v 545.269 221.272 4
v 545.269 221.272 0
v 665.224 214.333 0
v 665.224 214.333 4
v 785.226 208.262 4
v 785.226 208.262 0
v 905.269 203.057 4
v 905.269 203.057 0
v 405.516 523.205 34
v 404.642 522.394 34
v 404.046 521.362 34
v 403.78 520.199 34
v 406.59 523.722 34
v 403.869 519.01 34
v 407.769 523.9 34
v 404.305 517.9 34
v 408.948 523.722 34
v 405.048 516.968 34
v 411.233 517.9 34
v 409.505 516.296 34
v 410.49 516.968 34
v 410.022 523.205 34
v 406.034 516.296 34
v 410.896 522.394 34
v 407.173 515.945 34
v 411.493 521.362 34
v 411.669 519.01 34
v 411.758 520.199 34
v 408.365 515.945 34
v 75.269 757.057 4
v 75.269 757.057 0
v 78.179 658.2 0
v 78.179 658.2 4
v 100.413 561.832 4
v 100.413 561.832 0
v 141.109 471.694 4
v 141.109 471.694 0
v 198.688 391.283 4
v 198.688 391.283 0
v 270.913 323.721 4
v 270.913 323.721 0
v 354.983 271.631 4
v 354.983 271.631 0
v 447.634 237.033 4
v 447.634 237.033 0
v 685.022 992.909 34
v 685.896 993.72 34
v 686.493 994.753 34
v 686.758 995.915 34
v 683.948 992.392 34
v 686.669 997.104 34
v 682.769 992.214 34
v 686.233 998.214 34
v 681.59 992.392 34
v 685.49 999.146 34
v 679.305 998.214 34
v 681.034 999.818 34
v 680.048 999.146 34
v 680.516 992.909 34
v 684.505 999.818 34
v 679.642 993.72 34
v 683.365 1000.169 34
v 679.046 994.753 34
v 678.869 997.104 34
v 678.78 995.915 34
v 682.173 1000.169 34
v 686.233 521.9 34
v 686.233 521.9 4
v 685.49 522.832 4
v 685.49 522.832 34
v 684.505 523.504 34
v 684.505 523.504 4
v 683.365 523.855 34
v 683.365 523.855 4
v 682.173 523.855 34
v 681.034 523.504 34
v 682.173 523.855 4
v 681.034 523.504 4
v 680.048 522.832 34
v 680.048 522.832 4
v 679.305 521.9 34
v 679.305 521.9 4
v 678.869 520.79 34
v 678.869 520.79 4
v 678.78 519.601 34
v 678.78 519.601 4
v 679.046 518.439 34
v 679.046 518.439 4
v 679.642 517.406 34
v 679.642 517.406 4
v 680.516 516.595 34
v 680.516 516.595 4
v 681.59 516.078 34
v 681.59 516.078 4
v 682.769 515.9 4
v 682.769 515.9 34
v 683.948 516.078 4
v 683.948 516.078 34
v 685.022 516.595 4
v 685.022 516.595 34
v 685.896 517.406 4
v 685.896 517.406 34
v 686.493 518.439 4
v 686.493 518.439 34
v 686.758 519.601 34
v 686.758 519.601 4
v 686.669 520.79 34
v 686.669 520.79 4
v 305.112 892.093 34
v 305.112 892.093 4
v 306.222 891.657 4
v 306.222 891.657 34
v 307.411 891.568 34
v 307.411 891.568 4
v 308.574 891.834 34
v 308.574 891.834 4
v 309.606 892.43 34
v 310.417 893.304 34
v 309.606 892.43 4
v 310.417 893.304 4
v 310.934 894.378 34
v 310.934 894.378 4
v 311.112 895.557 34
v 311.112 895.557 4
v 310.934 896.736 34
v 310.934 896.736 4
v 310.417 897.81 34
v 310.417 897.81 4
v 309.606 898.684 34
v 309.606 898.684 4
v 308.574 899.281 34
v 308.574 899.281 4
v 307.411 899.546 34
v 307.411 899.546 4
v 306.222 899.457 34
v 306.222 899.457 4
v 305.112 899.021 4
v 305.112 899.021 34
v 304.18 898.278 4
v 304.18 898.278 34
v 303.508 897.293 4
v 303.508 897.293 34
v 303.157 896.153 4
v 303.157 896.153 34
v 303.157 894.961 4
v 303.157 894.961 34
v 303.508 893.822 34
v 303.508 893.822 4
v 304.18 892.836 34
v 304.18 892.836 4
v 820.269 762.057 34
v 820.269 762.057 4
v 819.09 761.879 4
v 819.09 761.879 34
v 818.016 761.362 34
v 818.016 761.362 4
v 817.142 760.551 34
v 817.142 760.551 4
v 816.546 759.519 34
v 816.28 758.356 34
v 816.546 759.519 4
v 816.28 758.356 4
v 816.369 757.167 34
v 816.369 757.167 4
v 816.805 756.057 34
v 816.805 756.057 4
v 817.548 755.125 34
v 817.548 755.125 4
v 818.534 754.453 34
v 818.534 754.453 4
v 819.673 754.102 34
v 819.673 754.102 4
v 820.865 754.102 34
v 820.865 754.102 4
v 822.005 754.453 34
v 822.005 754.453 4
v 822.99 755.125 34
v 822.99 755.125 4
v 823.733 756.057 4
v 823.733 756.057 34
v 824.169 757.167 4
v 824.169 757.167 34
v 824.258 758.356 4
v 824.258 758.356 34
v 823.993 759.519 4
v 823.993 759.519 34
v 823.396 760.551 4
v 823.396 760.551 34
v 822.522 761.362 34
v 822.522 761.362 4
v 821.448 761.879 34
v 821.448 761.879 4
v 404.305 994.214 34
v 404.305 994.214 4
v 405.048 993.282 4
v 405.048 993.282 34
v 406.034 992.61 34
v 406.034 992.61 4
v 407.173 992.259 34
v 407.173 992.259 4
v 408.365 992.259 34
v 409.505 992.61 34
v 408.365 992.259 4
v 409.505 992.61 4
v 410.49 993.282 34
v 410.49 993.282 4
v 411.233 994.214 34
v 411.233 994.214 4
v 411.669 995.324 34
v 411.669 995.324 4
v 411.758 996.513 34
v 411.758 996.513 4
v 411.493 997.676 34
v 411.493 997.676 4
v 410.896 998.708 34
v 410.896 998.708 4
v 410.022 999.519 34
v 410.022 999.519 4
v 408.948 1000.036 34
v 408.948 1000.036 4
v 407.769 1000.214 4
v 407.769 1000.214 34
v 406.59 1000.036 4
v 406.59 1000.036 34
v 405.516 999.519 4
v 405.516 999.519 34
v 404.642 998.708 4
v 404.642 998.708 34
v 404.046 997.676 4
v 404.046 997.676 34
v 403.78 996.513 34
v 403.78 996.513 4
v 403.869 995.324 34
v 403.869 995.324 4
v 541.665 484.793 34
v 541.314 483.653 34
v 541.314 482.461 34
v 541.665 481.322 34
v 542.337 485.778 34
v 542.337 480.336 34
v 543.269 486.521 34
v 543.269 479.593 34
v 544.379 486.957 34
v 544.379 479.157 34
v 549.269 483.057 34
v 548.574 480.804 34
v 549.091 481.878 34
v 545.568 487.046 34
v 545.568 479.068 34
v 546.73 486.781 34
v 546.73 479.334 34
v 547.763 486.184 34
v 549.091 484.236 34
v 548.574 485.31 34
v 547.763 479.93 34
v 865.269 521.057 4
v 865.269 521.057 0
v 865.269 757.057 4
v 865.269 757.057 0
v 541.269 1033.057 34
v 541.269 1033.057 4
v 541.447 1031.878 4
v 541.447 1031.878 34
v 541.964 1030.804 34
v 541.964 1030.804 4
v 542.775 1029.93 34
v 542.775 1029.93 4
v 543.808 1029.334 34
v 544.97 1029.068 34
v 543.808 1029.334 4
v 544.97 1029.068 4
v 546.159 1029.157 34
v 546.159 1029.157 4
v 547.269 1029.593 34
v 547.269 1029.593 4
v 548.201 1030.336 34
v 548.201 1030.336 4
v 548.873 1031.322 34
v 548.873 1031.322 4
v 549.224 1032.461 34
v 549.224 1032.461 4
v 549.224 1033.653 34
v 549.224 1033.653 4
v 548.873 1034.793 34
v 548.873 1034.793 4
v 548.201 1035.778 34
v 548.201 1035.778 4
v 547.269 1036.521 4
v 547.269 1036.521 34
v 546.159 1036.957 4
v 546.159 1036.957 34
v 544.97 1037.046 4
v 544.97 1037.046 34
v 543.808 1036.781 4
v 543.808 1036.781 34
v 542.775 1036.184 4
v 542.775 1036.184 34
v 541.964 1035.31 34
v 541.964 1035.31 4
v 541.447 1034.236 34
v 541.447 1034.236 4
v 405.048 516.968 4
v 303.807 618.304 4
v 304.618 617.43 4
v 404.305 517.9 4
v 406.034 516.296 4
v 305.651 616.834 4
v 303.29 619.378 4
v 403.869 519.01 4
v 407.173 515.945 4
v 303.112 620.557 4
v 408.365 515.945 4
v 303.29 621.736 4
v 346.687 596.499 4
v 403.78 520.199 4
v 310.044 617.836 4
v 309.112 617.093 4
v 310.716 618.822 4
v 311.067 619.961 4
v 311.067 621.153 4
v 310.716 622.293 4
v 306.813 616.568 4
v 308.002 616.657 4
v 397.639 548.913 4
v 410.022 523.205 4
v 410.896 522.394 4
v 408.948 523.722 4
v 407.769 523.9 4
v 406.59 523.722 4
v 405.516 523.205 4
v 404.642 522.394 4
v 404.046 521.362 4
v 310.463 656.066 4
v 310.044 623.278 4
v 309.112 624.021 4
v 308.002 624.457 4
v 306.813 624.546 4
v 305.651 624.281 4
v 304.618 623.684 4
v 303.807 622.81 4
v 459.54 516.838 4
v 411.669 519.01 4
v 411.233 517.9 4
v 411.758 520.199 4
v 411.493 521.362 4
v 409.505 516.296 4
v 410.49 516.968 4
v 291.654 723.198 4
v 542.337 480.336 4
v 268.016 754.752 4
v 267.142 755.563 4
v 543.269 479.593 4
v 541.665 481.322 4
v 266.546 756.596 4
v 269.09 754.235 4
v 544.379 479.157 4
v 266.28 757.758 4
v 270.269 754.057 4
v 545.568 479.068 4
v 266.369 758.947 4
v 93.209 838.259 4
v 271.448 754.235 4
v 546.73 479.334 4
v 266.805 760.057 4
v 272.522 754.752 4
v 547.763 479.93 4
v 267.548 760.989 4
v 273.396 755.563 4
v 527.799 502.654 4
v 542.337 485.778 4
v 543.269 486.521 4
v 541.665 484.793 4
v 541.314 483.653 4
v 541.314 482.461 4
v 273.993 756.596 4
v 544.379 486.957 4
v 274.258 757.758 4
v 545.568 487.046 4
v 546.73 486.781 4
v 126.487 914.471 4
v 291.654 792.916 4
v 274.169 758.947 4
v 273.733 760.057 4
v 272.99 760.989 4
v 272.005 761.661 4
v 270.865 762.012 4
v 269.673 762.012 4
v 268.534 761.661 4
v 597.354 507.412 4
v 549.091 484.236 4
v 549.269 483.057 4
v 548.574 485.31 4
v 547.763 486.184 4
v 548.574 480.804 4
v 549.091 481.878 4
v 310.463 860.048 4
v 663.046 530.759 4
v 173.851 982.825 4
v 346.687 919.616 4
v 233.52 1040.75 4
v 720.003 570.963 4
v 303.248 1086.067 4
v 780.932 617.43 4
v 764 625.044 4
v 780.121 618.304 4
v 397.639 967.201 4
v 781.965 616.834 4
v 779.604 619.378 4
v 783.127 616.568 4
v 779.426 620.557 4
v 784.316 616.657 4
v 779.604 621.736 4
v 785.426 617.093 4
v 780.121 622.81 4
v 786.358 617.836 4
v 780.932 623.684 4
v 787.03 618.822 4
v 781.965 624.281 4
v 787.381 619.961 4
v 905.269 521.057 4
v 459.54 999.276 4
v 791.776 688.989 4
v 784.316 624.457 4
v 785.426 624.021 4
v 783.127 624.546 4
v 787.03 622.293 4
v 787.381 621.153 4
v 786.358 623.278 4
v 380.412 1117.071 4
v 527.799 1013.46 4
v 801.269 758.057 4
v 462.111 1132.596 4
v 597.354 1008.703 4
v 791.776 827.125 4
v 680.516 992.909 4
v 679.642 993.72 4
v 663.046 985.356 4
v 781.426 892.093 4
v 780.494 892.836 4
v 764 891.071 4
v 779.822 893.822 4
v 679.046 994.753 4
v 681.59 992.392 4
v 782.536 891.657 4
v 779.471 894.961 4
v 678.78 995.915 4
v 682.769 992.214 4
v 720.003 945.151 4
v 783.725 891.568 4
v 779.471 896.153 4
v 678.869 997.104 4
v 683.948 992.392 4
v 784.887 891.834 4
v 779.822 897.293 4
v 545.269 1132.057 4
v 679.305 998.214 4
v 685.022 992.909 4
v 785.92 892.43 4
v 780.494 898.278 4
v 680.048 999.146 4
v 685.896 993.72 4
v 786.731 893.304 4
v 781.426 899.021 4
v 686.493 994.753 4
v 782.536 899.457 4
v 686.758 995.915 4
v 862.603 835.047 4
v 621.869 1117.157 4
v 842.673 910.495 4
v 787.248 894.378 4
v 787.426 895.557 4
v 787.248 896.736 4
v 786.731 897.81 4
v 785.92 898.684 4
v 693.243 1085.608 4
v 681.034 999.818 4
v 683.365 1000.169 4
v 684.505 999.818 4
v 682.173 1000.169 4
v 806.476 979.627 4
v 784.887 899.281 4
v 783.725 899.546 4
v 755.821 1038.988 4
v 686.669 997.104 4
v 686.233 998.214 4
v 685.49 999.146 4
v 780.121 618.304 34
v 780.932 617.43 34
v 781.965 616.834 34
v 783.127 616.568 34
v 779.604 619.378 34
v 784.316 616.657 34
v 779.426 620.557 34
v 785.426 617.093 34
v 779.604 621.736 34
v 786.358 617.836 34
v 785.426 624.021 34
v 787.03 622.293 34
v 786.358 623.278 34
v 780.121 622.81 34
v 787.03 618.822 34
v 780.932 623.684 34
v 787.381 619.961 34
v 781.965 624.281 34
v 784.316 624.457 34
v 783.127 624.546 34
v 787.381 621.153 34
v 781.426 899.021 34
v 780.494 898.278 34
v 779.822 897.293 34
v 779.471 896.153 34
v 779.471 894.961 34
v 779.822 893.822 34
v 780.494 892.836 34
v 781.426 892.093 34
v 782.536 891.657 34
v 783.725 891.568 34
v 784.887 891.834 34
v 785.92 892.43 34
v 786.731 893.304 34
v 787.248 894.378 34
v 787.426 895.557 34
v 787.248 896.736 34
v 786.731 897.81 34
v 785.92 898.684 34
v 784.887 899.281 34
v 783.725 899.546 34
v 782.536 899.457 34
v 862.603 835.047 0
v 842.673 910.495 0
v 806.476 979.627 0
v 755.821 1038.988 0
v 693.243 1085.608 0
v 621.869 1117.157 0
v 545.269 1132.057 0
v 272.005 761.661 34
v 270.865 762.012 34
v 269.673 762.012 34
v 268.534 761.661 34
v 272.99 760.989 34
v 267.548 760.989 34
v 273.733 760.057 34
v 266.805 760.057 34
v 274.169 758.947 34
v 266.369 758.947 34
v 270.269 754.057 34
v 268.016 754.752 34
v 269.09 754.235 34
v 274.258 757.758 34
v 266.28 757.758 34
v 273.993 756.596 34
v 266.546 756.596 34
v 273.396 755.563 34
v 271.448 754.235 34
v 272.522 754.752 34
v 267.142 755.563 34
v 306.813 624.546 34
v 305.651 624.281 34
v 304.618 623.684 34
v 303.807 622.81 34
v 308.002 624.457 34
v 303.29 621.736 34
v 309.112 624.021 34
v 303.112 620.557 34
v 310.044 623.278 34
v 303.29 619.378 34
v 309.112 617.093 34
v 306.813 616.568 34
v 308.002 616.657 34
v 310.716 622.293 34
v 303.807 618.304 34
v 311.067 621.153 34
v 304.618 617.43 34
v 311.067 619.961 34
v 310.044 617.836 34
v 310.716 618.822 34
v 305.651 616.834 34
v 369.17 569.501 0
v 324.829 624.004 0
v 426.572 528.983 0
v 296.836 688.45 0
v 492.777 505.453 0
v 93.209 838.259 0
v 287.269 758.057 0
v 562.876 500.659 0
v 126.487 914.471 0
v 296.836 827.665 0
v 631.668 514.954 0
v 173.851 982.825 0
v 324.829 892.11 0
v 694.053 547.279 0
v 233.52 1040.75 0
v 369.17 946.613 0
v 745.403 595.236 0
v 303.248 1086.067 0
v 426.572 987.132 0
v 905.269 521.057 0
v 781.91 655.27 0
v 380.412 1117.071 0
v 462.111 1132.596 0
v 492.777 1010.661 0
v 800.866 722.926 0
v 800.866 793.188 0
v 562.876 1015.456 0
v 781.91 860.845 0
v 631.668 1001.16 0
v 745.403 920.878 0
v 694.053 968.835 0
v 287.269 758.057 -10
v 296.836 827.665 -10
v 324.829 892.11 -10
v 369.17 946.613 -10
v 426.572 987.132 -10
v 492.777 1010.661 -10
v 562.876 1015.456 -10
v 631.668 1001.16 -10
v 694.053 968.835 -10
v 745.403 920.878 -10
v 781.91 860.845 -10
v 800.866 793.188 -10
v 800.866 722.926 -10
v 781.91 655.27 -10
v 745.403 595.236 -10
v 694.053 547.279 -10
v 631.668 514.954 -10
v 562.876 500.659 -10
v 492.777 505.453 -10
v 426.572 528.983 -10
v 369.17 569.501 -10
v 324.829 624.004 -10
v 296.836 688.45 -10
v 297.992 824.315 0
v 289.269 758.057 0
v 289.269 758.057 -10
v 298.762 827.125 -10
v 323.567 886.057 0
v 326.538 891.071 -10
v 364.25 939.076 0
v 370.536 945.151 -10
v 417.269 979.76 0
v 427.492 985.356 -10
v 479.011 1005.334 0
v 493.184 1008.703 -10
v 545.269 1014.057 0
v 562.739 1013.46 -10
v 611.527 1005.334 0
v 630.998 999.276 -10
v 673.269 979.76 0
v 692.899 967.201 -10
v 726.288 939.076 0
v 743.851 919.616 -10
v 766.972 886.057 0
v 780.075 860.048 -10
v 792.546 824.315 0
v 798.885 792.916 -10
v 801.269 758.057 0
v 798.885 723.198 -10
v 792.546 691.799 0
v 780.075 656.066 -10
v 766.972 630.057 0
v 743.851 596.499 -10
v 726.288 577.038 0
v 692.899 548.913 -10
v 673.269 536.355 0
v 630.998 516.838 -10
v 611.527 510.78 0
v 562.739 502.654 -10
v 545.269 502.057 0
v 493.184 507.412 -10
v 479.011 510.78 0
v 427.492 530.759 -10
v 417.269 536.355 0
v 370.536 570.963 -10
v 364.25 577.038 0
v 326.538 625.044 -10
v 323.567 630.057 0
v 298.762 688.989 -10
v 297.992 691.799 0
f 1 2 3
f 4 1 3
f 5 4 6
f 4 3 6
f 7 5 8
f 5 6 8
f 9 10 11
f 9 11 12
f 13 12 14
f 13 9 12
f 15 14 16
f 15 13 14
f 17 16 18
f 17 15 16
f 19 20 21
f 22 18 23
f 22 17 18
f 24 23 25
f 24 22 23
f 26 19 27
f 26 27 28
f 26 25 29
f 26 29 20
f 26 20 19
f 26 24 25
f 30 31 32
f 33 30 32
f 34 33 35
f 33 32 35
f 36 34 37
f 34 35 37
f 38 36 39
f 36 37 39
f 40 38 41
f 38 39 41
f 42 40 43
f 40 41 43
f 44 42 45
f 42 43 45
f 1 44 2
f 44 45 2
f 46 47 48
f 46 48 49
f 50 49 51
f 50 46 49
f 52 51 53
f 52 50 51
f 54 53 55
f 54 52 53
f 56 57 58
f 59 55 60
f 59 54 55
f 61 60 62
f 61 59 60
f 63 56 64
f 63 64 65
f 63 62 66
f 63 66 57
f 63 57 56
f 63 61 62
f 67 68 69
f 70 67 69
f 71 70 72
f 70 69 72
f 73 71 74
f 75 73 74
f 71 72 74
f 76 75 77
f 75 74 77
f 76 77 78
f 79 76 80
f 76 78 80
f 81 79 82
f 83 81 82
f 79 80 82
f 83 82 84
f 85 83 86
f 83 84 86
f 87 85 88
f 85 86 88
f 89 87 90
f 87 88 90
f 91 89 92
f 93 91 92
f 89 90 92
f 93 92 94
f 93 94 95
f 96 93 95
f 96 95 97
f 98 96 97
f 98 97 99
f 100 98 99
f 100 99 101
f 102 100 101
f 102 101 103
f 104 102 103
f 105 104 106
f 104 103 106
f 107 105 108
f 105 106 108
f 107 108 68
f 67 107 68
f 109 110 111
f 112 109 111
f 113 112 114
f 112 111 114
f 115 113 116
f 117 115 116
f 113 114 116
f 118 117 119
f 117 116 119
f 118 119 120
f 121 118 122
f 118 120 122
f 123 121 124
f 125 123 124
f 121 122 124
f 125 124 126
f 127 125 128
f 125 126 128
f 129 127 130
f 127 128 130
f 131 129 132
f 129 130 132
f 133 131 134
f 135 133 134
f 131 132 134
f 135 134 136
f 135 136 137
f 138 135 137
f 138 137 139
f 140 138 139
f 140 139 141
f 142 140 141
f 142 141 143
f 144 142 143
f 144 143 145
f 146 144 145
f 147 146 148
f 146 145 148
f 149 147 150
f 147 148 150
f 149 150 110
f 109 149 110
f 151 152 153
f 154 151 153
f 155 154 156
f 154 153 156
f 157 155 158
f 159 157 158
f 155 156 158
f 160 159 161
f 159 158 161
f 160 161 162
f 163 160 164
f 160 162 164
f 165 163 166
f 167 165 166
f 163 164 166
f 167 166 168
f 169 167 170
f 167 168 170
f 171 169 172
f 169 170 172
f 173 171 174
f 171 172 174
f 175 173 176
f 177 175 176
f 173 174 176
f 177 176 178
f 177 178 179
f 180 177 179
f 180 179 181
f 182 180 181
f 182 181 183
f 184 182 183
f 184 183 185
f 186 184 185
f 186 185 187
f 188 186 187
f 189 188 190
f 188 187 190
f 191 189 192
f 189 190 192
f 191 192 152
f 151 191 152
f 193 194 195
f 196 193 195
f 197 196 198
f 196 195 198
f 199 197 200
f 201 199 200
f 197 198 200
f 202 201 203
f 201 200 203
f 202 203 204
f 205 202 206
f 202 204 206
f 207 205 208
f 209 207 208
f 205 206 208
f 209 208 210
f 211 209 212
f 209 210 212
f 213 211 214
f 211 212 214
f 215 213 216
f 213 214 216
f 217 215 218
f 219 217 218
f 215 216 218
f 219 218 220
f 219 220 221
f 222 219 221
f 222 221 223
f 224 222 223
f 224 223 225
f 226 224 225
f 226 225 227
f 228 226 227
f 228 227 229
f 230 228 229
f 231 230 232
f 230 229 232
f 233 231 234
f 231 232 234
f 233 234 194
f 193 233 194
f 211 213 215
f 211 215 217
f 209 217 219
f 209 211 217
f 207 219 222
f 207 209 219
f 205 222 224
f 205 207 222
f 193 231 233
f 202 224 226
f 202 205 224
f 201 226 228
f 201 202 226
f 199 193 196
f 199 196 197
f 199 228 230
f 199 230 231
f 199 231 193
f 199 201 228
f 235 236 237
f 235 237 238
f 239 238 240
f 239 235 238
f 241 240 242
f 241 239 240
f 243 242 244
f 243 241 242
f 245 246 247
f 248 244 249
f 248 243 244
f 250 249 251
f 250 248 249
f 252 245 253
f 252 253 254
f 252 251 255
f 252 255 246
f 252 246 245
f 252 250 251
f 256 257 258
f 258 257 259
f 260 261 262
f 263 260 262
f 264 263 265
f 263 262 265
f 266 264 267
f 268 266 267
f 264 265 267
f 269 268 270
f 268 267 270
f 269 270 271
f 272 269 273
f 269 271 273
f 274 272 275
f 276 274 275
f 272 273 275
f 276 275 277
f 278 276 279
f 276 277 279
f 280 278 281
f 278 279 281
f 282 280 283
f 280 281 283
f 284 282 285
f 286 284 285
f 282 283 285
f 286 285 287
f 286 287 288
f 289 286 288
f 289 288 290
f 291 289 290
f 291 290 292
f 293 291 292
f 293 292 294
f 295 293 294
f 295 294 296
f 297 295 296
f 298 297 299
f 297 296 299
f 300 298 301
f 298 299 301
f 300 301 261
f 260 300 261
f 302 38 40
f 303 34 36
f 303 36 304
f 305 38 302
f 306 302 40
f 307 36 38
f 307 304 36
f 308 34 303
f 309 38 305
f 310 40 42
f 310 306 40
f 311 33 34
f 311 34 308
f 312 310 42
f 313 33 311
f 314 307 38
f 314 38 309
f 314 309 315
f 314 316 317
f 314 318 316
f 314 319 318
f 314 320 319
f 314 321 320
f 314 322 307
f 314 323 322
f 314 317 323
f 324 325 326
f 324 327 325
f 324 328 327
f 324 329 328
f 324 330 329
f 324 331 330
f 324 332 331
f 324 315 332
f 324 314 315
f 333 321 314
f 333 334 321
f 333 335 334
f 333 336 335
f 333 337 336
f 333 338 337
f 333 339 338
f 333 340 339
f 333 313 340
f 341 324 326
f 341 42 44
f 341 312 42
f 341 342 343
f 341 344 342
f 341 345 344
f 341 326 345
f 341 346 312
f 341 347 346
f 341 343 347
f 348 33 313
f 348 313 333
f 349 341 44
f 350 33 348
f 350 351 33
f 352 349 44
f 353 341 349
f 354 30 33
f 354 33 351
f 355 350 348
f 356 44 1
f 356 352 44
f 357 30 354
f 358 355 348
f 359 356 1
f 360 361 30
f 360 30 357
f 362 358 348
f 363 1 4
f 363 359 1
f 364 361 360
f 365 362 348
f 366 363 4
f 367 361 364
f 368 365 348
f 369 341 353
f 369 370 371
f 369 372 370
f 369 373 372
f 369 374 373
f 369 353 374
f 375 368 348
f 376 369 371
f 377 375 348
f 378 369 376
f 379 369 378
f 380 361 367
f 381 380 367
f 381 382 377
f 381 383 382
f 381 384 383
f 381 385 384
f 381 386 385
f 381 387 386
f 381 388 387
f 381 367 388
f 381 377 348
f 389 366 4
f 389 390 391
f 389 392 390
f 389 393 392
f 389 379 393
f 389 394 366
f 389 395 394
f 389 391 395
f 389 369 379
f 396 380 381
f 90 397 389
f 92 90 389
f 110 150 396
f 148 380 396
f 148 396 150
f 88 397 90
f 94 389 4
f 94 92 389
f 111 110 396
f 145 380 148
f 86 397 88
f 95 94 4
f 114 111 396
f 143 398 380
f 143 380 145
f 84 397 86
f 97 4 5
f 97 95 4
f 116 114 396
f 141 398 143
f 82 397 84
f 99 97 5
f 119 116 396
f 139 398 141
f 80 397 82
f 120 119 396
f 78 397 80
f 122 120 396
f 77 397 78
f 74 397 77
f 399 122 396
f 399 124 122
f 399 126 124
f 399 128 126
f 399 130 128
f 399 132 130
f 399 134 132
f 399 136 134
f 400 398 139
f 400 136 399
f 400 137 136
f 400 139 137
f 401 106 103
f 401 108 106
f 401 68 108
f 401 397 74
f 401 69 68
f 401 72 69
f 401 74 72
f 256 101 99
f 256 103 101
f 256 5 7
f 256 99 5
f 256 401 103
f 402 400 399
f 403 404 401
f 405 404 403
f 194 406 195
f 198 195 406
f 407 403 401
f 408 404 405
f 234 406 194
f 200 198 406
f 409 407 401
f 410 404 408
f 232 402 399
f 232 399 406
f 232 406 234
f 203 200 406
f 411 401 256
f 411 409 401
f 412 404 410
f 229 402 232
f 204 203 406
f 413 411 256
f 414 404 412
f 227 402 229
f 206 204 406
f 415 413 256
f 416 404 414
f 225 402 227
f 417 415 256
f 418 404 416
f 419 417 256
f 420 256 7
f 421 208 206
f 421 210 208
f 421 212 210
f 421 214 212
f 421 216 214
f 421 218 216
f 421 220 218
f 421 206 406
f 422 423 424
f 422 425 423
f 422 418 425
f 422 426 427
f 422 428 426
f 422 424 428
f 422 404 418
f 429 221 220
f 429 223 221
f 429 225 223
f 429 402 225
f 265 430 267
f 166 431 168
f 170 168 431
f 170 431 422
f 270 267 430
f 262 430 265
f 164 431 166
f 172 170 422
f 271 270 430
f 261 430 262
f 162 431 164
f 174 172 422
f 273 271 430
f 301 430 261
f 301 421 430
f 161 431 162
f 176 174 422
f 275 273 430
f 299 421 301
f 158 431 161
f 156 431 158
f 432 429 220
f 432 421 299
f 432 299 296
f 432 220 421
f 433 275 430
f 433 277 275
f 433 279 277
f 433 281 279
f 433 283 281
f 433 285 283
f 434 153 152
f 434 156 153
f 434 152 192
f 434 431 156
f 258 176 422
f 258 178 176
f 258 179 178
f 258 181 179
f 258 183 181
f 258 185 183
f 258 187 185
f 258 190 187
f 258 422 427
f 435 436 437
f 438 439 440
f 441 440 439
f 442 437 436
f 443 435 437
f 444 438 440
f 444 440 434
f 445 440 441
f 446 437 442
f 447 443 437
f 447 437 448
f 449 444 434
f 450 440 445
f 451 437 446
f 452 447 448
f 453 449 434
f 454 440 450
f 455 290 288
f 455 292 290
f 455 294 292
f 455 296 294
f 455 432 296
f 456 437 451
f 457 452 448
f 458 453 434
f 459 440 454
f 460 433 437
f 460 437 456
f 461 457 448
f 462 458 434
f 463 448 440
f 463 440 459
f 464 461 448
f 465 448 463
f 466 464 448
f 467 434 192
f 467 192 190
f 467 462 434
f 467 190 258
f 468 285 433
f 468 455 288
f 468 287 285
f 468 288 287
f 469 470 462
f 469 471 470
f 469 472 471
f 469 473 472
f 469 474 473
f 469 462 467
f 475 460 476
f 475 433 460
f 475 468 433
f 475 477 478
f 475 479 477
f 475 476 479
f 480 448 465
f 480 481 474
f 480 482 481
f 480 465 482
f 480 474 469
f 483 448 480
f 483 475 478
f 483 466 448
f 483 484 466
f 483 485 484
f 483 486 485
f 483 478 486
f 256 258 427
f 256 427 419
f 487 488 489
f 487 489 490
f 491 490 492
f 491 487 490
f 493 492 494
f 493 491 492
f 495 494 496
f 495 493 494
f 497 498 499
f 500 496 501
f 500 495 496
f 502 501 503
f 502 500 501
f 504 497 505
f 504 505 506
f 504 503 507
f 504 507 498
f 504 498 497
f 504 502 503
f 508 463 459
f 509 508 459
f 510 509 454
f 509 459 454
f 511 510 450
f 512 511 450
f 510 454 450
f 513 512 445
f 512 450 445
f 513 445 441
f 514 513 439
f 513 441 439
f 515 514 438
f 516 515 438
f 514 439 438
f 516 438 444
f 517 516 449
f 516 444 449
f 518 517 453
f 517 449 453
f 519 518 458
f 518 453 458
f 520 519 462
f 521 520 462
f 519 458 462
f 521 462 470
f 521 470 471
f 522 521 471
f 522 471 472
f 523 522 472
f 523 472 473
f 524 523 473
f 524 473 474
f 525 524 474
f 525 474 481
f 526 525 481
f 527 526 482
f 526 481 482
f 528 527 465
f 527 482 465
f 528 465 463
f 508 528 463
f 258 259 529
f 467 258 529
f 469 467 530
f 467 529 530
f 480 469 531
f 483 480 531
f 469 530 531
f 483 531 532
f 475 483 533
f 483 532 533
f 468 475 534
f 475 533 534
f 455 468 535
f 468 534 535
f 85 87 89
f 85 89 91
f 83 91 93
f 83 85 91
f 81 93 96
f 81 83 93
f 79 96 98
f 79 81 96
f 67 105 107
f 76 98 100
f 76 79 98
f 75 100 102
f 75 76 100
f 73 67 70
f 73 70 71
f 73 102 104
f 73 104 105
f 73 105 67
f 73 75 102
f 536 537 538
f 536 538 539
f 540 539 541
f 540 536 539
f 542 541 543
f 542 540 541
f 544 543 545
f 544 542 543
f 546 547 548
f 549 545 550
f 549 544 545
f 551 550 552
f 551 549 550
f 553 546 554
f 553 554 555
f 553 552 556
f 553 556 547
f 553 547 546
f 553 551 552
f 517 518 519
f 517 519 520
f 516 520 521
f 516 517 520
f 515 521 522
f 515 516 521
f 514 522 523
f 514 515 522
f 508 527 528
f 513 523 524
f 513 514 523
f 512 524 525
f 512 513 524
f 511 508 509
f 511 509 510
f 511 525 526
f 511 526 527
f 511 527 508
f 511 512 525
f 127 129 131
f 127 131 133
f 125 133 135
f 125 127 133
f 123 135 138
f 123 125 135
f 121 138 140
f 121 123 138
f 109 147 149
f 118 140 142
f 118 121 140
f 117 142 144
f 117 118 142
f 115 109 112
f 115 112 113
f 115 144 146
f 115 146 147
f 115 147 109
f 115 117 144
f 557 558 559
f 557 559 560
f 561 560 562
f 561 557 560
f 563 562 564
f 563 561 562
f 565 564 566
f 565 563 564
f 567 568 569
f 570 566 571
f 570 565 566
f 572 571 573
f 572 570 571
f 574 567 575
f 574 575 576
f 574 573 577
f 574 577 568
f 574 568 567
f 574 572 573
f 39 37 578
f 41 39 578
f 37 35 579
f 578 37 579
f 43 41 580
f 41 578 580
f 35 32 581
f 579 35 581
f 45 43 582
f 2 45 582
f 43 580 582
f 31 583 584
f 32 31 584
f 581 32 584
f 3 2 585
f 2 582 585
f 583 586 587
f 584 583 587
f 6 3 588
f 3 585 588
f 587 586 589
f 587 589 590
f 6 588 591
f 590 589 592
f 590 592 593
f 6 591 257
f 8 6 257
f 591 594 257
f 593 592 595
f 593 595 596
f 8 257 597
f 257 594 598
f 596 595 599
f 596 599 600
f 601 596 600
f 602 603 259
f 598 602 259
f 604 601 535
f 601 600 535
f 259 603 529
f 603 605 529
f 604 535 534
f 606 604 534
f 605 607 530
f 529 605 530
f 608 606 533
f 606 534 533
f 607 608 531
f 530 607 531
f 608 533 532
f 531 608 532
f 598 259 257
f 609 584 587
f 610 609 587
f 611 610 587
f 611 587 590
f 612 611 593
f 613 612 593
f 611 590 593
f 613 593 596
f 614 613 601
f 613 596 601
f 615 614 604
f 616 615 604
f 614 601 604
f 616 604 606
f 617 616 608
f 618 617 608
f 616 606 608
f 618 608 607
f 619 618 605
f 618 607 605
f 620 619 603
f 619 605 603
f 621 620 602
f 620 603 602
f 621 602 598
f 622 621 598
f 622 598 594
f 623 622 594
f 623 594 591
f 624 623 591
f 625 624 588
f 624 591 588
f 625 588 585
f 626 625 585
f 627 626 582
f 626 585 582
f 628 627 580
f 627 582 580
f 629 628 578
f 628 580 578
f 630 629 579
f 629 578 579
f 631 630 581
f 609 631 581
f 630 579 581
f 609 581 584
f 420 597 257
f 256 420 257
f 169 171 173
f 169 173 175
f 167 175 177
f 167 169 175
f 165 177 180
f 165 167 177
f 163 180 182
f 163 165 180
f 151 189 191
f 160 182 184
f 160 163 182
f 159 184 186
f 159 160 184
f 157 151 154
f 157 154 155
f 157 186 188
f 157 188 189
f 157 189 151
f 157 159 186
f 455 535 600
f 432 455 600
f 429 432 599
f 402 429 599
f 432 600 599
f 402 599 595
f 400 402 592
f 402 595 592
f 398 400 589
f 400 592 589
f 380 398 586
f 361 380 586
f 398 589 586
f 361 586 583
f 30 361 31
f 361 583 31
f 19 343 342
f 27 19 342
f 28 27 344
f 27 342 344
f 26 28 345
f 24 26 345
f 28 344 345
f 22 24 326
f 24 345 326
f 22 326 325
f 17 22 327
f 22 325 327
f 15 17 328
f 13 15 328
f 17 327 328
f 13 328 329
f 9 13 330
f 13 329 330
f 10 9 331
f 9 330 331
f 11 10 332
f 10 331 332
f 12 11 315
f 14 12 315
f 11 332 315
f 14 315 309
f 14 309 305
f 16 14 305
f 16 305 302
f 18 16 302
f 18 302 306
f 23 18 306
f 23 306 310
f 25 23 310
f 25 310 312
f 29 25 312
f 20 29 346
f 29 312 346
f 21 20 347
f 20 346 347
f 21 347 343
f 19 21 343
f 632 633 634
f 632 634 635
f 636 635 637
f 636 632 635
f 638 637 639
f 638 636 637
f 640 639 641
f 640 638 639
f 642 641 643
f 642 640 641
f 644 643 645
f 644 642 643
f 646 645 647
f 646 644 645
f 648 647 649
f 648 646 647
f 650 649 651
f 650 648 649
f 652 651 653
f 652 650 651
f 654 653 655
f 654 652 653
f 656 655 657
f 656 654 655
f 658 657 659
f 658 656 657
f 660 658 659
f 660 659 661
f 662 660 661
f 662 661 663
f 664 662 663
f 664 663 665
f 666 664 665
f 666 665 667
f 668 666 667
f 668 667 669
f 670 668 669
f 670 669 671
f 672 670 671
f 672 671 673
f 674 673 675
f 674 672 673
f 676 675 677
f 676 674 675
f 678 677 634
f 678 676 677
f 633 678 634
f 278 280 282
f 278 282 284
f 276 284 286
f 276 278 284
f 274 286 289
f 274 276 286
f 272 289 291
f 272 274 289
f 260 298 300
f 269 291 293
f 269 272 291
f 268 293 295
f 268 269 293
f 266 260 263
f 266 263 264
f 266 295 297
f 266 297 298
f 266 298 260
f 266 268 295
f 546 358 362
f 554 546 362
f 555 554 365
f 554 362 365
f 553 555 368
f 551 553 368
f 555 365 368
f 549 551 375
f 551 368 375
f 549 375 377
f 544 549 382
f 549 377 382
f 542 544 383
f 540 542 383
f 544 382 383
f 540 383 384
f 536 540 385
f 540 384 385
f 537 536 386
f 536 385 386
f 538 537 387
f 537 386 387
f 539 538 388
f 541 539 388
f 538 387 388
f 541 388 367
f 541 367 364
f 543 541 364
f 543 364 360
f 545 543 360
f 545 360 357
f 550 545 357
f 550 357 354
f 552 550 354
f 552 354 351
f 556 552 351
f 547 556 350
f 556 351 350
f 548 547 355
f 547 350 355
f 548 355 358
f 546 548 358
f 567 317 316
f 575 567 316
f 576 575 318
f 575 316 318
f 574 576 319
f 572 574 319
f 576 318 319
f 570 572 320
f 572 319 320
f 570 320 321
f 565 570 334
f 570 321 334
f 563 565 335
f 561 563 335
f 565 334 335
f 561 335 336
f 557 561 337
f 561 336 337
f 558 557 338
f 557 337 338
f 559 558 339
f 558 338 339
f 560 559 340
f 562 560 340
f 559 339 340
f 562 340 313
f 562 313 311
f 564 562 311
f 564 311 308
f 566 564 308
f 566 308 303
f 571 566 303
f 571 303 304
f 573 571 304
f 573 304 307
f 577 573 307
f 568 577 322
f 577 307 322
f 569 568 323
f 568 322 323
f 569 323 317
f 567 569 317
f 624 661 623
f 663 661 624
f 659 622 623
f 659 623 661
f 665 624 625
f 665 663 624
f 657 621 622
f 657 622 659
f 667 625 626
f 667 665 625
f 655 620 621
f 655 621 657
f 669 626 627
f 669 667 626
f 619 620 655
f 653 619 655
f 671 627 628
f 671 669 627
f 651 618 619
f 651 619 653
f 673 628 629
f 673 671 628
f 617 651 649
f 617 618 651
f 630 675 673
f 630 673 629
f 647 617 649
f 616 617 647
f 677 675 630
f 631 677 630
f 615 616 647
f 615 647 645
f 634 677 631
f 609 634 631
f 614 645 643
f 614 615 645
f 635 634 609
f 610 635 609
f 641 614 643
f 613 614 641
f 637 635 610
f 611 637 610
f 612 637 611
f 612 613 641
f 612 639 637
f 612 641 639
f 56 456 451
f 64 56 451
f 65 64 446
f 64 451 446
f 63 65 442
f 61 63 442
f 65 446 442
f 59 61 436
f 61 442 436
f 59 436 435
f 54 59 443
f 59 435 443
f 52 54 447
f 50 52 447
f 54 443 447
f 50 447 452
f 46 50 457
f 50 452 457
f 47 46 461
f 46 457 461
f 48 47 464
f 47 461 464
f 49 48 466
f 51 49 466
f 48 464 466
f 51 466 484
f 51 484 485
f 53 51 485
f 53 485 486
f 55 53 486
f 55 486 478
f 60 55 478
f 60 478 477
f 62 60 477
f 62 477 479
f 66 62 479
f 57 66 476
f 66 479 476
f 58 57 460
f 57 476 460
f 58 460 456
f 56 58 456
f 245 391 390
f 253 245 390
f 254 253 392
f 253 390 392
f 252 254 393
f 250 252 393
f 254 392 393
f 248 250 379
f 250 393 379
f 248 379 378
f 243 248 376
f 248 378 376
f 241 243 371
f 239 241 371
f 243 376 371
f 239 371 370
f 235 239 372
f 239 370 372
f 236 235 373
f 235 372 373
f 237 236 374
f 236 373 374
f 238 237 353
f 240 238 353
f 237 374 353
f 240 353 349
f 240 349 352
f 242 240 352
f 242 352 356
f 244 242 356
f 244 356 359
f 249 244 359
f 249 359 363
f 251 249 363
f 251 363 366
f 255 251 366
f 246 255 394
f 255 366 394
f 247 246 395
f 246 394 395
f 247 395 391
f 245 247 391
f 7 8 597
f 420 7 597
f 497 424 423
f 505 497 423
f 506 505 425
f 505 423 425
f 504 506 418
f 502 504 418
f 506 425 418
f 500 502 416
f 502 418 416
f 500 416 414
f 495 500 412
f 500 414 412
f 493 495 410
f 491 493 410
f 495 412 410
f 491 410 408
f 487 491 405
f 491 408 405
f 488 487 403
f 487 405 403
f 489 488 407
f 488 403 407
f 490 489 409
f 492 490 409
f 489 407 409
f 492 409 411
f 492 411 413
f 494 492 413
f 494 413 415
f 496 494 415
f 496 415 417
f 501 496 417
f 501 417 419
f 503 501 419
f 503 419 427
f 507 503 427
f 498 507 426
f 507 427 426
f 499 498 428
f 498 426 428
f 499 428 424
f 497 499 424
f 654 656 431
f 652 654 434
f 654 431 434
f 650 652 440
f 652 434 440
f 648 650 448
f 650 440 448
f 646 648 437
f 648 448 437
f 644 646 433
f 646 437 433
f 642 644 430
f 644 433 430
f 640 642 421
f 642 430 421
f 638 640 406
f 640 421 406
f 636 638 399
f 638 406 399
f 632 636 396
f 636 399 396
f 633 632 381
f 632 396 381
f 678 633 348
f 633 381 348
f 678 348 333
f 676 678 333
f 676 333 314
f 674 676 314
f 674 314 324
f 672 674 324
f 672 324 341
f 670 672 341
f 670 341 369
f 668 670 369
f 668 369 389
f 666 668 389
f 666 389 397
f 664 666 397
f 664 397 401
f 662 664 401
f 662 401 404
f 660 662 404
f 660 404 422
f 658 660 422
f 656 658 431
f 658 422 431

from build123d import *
from build123d.topology import SkipClean

# Parameters (mm, degrees)
BOSS_EXTRUDE1_DEPTH = 4
SKETCH2_R           = 256
CUT_EXTRUDE1_DEPTH  = 4
SKETCH3_R           = 258
SKETCH3_R_2         = 256
EXTRUDE_THIN1_DEPTH = 10
SKETCH5_R           = 4
BOSS_EXTRUDE2_DEPTH = 30
CIRPATTERN1_COUNT   = 12


with BuildPart() as part:
    # Sketch1 → Boss-Extrude1 (new body)
    with BuildSketch(Plane.XY):
        with BuildLine():
            Line((865.269127642, 521.057153497), (865.269127642, 757.057153497))
            ThreePointArc((865.269127642, 757.057153497), (782.812941082, 1010.7278743), (545.269127642, 1132.057153497))
            ThreePointArc((545.269127642, 1132.057153497), (233.519744905, 1040.749713195), (75.269127642, 757.057153497))
            ThreePointArc((75.269127642, 757.057153497), (198.687627947, 391.283260157), (545.269127642, 221.271697797))
            ThreePointArc((545.269127642, 221.271697797), (725.219790584, 211.189307063), (905.269127642, 203.057153497))
            Line((905.269127642, 203.057153497), (905.269127642, 521.057153497))
            Line((905.269127642, 521.057153497), (865.269127642, 521.057153497))
        make_face()
    extrude(amount=BOSS_EXTRUDE1_DEPTH)

    # Sketch2 → Cut-Extrude1 (cut)
    with BuildSketch(Plane.XY.offset(4)):
        with Locations((545.269127642, 758.057153497)):
            Circle(SKETCH2_R)
    extrude(amount=-CUT_EXTRUDE1_DEPTH, mode=Mode.SUBTRACT)

    # Sketch3 → Extrude-Thin1 (add)
    with SkipClean():  # the faces are left unmerged after this step: merging them gives an invalid solid
        with BuildSketch(Plane(origin=(0, 0, 0), x_dir=(-1, 0, 0), z_dir=(0, 0, -1))):
            with Locations((-545.269127642, 758.057153497)):
                Circle(SKETCH3_R)
            with Locations((-545.269127642, 758.057153497)):
                Circle(SKETCH3_R_2, mode=Mode.SUBTRACT)
        extrude(amount=EXTRUDE_THIN1_DEPTH)
    add(part.part.scale(1), mode=Mode.REPLACE)  # the faces are merged on a copy

    # Sketch5 → Boss-Extrude2 (add)
    with BuildSketch(Plane.XY.offset(4)):
        with Locations((545.269127642, 1033.057153497)):
            Circle(SKETCH5_R)
    boss_extrude2 = extrude(amount=BOSS_EXTRUDE2_DEPTH)

    # CirPattern1: Boss-Extrude2 ×12 about axis
    cirpattern1_axis = Axis((545.269127642, 758.057153497, 4), (0, 0, 1))
    for i in range(1, CIRPATTERN1_COUNT):
        add(boss_extrude2.rotate(cirpattern1_axis, i * 360 / CIRPATTERN1_COUNT))


solid = part.part
